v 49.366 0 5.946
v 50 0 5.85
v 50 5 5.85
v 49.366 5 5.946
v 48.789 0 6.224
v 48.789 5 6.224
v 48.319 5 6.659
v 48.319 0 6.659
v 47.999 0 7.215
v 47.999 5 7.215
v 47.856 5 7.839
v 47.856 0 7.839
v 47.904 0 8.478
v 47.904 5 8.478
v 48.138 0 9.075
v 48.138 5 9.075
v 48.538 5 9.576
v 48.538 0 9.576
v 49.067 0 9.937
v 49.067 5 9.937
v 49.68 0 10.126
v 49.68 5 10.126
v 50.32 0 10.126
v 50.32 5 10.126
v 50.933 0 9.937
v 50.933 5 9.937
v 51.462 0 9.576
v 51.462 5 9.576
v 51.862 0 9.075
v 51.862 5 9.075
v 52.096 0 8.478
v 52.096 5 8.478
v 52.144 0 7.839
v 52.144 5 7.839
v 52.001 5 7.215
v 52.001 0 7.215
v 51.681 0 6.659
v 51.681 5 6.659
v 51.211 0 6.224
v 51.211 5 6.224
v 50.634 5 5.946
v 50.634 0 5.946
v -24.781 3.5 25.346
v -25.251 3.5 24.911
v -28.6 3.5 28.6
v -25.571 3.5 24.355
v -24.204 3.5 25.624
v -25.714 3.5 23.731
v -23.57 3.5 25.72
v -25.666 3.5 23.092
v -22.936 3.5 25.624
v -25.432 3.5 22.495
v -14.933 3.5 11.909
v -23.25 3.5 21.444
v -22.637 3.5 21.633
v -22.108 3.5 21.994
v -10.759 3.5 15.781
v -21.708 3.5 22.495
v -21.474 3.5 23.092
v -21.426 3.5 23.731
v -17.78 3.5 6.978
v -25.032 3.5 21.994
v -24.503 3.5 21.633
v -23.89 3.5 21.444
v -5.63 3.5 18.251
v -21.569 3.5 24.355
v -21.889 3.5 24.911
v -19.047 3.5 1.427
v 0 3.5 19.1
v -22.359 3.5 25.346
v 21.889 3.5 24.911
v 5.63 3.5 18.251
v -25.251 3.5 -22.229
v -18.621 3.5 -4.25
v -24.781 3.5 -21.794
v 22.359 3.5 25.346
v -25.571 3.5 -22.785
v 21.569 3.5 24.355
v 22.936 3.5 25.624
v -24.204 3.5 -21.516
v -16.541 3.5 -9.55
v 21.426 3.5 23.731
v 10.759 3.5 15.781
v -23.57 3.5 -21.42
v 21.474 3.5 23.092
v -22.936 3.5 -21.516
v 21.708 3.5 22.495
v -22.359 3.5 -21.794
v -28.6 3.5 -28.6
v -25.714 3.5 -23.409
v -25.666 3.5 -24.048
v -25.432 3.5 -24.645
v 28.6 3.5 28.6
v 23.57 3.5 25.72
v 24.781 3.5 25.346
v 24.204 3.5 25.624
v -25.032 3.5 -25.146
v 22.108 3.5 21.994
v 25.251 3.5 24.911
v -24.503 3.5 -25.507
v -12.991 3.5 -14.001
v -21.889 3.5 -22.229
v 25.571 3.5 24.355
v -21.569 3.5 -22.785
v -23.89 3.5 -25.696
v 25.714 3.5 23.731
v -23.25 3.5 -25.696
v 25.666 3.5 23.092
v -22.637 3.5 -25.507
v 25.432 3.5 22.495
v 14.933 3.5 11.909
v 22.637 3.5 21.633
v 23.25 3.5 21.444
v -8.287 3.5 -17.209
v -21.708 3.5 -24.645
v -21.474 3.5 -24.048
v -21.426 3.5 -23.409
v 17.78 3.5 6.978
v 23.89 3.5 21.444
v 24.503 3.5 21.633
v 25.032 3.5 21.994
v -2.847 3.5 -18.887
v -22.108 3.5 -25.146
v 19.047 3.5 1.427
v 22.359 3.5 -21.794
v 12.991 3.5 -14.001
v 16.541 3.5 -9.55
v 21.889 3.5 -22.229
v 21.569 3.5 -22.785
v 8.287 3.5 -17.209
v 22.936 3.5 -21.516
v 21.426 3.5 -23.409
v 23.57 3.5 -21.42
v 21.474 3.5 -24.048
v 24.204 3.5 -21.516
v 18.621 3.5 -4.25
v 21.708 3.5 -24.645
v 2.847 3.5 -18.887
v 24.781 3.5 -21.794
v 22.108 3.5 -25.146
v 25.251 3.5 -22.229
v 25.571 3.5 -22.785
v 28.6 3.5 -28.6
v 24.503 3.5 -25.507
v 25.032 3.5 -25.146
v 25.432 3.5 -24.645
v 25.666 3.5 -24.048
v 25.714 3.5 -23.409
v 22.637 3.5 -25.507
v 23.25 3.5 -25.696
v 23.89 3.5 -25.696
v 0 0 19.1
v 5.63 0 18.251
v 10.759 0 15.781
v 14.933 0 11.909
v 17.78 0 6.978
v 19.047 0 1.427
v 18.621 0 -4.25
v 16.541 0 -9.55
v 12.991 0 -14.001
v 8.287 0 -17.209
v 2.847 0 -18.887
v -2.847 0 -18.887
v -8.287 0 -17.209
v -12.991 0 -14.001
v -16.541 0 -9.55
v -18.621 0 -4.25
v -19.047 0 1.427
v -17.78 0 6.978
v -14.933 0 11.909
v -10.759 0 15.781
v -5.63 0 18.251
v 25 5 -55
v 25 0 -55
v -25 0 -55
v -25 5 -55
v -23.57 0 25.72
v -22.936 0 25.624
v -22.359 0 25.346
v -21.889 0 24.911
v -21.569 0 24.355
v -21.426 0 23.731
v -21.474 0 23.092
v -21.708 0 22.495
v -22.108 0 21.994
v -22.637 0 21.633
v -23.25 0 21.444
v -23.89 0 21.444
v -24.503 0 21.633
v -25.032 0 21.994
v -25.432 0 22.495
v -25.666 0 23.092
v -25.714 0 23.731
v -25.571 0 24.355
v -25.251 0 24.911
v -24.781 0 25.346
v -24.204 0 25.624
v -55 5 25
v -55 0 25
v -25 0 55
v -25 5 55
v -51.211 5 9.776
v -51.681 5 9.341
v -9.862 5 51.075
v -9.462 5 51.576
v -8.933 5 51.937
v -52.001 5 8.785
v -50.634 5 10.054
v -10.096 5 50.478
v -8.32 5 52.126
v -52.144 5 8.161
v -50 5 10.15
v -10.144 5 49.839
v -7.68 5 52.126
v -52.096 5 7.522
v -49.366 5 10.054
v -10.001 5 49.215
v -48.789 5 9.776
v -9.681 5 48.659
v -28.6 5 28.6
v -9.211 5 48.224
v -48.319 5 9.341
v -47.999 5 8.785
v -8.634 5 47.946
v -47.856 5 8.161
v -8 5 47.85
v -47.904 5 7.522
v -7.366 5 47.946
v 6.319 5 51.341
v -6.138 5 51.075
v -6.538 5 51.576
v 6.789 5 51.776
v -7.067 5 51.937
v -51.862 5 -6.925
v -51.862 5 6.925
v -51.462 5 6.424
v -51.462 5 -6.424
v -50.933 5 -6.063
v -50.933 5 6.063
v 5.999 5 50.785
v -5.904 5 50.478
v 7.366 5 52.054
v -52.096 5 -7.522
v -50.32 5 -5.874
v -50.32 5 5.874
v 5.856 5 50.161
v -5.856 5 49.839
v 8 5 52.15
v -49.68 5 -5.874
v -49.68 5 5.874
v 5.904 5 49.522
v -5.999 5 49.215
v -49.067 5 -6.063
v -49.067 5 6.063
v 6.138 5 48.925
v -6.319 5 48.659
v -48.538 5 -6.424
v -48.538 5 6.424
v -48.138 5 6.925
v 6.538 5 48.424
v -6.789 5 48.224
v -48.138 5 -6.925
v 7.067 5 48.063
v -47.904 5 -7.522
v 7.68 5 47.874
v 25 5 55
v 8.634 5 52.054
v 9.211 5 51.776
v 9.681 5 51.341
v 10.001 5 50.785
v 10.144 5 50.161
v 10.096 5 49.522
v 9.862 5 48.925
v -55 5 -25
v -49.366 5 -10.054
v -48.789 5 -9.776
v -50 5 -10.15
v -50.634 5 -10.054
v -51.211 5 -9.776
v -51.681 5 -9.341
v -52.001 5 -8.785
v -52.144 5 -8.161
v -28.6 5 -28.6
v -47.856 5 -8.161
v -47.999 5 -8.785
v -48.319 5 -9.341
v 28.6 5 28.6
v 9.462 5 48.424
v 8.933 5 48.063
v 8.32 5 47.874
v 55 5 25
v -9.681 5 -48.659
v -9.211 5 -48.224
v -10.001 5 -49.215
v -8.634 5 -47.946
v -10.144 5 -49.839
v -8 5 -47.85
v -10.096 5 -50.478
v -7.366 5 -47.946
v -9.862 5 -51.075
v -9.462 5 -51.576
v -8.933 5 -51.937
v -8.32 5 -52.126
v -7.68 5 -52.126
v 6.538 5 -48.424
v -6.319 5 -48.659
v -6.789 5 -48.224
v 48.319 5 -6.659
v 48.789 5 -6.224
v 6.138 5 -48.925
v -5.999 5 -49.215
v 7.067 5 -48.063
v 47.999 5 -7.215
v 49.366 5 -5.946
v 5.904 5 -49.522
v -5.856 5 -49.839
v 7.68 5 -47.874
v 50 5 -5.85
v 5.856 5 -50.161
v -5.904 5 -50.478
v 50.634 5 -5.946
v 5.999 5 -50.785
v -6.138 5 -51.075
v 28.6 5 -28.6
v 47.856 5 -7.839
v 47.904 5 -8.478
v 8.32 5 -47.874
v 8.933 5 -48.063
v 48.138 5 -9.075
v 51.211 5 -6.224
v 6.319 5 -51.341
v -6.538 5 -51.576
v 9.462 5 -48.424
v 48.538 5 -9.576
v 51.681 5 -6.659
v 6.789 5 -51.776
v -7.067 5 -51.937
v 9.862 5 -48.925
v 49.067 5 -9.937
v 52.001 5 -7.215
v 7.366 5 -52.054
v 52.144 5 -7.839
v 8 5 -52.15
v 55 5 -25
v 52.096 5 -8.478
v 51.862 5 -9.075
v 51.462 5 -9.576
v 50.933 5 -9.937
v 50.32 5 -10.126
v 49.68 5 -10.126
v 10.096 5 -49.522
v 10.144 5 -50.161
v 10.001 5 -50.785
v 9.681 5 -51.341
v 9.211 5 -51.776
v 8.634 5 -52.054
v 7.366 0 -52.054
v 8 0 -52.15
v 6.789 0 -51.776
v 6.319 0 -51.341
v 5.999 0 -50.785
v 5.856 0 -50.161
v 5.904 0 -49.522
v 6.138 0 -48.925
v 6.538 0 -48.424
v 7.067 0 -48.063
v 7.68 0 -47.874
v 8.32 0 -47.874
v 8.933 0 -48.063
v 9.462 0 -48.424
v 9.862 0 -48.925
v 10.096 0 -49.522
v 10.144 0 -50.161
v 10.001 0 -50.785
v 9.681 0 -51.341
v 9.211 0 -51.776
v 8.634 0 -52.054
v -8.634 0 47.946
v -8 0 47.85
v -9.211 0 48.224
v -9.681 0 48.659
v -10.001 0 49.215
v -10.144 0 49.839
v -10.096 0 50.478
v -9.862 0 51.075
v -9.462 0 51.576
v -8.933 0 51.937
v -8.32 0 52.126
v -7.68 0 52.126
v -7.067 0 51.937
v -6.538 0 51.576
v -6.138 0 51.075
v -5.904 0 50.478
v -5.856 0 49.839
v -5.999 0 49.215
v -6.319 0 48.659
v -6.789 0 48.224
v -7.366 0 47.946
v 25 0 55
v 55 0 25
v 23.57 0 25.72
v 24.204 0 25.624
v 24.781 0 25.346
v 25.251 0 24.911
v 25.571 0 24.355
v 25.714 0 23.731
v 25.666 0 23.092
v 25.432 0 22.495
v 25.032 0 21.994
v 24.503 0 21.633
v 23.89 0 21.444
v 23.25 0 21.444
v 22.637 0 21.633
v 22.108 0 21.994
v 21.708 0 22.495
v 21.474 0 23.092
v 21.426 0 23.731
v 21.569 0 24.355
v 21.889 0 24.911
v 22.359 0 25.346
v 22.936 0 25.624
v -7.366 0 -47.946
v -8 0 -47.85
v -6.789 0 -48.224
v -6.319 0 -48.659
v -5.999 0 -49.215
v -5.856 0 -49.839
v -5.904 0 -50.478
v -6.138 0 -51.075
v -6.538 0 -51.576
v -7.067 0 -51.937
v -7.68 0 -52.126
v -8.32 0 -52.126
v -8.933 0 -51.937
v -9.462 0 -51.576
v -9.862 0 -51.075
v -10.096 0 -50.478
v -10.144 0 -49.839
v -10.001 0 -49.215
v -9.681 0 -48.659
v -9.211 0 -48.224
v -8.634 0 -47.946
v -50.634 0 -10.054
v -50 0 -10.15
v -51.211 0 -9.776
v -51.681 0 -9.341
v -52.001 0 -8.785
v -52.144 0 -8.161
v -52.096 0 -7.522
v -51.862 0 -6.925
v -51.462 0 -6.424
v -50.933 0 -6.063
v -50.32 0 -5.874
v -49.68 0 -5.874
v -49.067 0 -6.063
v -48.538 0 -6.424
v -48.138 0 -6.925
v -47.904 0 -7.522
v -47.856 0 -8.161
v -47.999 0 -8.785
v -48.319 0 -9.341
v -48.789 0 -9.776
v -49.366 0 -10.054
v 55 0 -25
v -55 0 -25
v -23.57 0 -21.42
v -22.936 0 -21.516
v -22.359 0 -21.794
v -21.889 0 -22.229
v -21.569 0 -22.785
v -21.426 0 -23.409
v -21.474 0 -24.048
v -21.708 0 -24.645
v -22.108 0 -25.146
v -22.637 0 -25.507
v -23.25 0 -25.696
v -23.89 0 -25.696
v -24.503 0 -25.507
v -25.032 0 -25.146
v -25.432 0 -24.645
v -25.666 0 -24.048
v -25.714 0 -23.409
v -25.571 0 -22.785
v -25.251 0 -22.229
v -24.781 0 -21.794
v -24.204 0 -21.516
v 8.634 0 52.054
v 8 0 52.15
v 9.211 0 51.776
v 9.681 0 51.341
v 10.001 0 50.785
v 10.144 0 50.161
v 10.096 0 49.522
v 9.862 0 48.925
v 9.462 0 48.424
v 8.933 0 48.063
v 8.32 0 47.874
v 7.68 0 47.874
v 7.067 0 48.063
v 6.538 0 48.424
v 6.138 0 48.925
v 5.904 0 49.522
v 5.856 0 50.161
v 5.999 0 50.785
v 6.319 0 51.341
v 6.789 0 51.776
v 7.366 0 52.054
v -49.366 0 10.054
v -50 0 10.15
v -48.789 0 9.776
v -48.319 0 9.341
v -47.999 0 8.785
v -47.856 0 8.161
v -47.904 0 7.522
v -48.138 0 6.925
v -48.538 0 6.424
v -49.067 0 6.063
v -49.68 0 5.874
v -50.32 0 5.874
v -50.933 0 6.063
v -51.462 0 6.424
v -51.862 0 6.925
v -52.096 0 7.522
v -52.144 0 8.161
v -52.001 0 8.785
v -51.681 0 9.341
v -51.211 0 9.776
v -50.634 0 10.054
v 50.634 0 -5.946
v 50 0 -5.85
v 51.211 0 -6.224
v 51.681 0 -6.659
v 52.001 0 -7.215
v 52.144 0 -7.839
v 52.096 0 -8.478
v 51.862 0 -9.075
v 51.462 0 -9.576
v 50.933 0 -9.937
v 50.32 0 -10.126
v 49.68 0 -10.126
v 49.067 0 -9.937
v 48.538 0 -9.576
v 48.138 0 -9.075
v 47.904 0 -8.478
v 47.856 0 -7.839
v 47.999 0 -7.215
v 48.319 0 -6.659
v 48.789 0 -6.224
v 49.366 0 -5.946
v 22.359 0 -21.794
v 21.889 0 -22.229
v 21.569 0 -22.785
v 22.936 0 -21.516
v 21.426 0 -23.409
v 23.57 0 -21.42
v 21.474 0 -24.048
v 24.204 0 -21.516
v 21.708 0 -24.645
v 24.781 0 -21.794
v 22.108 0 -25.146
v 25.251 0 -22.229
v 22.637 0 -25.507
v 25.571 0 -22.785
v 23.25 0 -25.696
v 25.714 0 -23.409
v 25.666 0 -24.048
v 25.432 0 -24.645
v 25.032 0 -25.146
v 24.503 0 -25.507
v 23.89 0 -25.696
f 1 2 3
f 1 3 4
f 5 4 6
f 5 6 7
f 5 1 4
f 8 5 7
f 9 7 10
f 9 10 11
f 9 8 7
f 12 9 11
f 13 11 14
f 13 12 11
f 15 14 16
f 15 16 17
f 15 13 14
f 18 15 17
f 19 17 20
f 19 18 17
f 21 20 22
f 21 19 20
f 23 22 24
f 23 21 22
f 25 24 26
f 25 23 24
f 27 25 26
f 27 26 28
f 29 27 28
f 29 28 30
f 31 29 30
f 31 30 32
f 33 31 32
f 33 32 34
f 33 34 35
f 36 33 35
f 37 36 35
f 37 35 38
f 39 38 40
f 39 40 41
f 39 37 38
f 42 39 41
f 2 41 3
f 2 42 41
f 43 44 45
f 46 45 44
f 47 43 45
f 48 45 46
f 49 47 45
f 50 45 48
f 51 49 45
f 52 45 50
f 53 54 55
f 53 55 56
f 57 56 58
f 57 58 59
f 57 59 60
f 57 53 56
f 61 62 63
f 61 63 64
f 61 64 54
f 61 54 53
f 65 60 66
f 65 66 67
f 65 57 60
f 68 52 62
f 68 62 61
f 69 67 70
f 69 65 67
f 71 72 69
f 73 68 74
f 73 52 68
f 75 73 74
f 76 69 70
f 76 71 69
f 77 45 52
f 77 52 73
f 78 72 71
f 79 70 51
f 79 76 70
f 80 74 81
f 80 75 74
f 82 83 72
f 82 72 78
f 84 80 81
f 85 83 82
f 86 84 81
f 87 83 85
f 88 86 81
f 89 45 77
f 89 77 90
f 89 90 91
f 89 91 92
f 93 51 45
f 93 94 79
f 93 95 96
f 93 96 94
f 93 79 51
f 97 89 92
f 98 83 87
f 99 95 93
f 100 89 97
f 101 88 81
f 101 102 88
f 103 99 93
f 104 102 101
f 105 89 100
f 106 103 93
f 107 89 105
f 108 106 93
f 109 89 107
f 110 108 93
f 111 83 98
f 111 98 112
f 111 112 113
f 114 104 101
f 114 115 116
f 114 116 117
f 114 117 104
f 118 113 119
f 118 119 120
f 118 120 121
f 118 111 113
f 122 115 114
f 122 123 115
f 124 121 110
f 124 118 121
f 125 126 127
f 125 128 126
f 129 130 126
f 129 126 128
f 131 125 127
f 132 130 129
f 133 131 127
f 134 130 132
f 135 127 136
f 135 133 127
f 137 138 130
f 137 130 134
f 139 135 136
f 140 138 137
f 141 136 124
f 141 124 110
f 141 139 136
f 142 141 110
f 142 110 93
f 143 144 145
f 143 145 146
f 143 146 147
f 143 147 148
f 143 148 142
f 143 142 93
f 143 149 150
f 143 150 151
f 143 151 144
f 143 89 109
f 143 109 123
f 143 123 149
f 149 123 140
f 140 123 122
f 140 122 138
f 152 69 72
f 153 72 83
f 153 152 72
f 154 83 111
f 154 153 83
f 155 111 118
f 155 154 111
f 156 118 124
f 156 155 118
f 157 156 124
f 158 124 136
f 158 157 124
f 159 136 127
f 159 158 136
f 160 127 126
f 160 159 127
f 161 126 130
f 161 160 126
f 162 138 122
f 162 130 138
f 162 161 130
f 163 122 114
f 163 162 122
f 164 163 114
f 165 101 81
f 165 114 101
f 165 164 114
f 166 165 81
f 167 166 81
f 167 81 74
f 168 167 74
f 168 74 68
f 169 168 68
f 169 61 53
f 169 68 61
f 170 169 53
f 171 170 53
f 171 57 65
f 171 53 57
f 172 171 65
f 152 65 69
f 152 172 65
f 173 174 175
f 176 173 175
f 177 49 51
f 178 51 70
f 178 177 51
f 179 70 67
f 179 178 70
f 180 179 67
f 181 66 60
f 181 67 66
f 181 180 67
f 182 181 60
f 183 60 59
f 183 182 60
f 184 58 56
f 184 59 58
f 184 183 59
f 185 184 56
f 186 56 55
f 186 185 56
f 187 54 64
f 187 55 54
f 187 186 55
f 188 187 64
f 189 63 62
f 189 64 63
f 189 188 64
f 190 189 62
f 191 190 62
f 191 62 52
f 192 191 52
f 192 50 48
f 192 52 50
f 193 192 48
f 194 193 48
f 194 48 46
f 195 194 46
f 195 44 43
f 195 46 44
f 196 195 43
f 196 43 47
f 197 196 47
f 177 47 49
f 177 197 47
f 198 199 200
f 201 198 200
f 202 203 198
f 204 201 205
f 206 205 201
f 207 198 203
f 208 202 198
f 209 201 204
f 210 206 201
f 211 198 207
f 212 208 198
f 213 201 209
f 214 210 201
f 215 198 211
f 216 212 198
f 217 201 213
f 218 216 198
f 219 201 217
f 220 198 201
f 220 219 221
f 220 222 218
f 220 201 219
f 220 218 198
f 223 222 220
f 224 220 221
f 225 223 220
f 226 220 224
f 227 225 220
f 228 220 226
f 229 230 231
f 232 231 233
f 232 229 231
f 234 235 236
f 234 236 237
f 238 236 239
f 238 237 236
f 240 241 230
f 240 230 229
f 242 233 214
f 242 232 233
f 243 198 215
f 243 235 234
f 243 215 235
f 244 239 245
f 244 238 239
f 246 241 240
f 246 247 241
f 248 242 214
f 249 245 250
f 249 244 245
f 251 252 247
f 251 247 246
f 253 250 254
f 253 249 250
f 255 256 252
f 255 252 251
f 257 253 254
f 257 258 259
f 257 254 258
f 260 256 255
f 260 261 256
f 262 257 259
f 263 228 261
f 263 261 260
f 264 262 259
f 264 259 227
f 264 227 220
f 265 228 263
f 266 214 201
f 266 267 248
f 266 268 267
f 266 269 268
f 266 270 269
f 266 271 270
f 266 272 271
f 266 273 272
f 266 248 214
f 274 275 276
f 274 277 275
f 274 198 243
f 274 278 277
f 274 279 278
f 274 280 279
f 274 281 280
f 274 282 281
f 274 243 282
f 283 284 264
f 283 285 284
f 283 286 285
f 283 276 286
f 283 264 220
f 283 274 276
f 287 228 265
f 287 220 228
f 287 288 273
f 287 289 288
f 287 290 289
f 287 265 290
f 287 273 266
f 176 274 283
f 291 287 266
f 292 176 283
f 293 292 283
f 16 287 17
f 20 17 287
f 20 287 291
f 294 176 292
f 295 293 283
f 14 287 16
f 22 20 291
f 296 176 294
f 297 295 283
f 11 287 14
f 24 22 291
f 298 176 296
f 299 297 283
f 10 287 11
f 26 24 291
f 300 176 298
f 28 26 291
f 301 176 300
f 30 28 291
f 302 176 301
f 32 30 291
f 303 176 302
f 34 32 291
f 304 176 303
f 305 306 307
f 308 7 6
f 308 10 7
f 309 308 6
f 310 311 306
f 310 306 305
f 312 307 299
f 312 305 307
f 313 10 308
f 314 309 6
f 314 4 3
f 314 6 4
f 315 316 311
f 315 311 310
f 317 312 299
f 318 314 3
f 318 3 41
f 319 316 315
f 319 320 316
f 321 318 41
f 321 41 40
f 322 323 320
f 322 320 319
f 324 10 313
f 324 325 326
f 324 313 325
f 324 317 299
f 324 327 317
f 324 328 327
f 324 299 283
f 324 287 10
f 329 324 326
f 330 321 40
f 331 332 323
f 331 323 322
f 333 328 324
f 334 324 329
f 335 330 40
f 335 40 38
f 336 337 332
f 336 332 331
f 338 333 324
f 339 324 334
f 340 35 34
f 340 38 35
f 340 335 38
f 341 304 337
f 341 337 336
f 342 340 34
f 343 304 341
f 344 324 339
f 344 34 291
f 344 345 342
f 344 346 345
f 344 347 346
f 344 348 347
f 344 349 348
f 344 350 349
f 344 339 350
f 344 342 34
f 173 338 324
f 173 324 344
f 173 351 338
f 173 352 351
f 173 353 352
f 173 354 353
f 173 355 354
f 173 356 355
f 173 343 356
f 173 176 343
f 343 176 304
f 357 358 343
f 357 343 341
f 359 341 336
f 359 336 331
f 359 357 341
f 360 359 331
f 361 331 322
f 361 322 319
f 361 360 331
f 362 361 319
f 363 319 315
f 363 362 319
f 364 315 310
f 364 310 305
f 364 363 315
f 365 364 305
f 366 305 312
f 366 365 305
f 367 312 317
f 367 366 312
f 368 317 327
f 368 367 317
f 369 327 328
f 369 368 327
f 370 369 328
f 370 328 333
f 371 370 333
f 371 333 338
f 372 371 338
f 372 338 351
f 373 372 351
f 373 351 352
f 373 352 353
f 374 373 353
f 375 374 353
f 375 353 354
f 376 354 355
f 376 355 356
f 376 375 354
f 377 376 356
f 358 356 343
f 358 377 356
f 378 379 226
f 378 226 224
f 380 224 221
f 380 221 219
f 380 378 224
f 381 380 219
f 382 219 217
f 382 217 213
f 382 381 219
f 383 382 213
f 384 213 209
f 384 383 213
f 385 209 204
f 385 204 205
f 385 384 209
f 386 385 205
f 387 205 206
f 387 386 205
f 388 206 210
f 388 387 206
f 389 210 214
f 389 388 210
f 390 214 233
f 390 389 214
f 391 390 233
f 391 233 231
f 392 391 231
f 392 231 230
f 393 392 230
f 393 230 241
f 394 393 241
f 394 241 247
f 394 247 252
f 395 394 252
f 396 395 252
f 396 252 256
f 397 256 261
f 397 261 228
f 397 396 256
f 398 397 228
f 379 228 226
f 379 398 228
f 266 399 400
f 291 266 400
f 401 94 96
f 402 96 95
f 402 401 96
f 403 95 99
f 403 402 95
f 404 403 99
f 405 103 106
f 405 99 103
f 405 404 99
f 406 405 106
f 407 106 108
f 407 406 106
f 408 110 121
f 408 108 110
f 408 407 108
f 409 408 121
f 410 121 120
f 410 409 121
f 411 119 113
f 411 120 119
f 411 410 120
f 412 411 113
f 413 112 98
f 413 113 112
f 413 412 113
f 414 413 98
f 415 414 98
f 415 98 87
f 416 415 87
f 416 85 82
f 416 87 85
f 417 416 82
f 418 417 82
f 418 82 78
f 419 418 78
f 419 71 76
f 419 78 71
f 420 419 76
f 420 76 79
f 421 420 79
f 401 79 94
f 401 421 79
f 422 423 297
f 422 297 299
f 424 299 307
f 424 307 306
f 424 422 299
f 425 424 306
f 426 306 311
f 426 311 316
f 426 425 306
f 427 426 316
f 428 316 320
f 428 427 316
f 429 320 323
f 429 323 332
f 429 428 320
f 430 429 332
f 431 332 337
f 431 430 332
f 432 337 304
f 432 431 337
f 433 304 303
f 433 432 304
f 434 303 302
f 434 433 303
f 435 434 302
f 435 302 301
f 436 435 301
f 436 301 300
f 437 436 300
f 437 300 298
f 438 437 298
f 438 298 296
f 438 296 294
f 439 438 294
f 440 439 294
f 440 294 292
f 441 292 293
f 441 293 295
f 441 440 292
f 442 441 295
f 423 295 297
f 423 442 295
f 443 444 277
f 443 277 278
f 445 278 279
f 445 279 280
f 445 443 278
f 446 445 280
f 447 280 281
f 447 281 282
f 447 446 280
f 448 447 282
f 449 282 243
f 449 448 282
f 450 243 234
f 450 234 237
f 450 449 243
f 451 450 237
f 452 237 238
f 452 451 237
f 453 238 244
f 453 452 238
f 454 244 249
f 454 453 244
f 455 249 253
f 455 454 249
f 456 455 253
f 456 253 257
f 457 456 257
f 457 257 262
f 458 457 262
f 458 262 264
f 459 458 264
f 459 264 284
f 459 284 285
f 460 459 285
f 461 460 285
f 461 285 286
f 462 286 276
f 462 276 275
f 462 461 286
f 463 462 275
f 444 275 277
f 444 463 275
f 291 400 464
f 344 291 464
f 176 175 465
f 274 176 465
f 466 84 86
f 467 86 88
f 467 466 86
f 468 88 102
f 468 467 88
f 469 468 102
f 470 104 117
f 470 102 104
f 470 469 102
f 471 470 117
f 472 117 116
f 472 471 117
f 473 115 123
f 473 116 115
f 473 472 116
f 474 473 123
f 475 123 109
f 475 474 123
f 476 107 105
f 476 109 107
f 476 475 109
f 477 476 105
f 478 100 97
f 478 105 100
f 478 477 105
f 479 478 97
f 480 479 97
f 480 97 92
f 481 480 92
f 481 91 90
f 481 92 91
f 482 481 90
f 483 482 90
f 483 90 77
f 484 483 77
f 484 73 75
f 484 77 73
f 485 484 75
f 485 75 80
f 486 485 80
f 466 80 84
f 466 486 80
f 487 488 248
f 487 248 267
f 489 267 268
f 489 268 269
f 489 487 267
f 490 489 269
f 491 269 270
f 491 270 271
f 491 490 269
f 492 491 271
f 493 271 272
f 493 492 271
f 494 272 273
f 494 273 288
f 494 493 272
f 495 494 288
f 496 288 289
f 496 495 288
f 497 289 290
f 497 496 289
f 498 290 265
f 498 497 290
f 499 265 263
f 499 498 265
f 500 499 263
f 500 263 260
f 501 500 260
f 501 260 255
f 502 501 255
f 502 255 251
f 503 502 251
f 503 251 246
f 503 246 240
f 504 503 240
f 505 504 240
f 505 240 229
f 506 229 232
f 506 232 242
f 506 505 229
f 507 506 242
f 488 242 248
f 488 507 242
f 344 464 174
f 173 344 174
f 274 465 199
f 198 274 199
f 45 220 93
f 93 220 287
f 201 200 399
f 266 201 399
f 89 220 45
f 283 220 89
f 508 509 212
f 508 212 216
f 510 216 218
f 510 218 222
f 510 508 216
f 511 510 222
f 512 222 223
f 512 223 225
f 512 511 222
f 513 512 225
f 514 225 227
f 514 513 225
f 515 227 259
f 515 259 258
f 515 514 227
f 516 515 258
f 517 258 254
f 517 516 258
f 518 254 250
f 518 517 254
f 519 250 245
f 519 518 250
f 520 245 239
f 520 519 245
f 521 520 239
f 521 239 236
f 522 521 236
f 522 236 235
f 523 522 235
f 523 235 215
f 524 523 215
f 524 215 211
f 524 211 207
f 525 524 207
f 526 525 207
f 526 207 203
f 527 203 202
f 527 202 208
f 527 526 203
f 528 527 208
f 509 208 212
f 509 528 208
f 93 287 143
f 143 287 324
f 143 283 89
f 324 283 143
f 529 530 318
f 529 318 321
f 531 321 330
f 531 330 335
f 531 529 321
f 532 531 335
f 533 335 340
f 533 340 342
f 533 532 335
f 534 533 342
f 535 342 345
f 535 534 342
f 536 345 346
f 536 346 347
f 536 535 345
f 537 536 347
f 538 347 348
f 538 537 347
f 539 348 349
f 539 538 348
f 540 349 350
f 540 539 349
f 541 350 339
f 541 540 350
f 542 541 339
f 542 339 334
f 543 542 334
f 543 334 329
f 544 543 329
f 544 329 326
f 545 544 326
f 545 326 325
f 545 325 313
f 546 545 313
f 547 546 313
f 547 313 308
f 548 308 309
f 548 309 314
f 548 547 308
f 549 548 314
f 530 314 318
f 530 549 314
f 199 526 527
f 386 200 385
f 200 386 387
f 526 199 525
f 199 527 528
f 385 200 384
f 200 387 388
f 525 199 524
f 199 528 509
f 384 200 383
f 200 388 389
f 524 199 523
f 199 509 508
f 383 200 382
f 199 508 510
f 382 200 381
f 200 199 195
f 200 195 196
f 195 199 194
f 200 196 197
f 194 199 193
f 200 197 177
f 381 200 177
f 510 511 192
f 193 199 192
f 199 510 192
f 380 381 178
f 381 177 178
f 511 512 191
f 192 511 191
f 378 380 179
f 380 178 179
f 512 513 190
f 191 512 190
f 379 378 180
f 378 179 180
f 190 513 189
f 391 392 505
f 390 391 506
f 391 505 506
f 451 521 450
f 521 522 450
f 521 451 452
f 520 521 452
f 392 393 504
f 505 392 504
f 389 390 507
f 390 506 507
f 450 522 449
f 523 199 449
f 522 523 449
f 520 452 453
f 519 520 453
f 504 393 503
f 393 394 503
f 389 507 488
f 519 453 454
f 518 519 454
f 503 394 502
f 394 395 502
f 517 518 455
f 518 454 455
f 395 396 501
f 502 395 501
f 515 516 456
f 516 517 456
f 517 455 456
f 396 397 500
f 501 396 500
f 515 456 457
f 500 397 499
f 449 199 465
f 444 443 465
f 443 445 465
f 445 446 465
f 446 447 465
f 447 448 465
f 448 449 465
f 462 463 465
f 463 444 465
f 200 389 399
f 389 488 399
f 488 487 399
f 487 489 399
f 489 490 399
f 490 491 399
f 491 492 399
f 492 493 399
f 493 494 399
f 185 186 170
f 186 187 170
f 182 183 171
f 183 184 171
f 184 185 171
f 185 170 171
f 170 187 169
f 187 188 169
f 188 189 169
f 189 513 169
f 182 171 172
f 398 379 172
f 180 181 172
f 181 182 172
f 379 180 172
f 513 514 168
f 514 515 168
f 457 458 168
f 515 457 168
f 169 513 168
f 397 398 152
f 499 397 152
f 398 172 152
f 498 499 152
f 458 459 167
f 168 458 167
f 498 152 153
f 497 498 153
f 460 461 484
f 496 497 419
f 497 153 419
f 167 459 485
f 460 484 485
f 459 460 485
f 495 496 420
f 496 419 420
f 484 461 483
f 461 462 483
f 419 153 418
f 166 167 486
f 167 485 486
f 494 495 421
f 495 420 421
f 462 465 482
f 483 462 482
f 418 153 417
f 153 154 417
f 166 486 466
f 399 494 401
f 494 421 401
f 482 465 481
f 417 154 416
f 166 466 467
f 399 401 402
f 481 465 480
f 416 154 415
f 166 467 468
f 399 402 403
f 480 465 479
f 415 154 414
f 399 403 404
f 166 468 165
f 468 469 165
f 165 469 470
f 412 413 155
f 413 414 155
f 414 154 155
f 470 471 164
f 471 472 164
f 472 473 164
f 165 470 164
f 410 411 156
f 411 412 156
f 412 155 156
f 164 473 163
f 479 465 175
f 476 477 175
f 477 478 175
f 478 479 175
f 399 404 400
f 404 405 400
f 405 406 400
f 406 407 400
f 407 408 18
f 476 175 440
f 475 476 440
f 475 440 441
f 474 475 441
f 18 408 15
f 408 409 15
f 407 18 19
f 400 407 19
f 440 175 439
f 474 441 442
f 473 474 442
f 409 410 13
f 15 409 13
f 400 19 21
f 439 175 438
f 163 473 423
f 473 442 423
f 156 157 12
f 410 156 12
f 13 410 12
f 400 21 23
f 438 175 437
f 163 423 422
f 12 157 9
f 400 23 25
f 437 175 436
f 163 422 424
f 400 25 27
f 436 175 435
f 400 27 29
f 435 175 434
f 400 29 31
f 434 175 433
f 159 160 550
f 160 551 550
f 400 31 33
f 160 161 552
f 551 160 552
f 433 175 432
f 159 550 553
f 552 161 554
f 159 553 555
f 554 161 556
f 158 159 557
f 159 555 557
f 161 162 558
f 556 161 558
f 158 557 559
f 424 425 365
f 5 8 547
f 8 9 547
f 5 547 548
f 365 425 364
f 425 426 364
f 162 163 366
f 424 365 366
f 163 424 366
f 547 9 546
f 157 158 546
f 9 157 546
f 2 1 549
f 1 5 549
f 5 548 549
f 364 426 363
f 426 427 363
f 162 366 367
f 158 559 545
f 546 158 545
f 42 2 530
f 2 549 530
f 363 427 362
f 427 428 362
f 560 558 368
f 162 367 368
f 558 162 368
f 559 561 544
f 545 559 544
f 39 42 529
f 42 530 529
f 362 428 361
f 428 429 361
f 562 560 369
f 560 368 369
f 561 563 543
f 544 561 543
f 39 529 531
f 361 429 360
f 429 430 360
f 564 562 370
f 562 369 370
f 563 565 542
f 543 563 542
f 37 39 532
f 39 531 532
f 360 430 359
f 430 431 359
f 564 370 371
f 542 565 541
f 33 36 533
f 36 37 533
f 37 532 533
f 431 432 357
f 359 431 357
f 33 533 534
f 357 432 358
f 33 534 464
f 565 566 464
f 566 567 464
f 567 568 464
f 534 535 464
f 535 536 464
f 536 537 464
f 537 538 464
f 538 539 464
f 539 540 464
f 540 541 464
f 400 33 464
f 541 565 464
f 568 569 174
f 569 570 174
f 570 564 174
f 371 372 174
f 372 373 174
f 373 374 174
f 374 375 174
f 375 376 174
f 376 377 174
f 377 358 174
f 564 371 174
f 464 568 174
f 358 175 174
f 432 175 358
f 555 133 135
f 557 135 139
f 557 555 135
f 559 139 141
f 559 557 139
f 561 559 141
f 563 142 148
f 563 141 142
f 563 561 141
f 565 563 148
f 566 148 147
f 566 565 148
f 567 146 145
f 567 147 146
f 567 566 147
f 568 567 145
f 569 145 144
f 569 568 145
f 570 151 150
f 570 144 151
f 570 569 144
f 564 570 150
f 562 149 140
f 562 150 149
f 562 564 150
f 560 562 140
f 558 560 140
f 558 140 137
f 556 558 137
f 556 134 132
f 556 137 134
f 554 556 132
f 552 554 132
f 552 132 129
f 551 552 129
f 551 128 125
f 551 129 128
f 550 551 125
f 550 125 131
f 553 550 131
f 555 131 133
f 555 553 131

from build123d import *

# Parameters (mm, degrees)
SKETCH1_R           = 2.15
SKETCH1_R_2         = 19.1
BOSS_EXTRUDE1_DEPTH = 5
SKETCH2_W           = 57.2
SKETCH2_H           = 57.2
CUT_EXTRUDE1_DEPTH  = 1.5


with BuildPart() as part:
    # Sketch1 → Boss-Extrude1 (new body)
    with BuildSketch(Plane(origin=(0, 0, 0), x_dir=(1, 0, 0), z_dir=(0, 1, 0))):
        Polygon((-25, -55), (25, -55), (55, -25), (55, 25), (25, 55), (-25, 55), (-55, 25), (-55, -25), align=None)
        with Locations(Location((23.57, 23.57, 0), (0, 0, 270))):
            Circle(SKETCH1_R, mode=Mode.SUBTRACT)
        with Locations(Location((-23.57, 23.57, 0), (0, 0, 270))):
            Circle(SKETCH1_R, mode=Mode.SUBTRACT)
        with Locations(Location((-23.57, -23.57, 0), (0, 0, 270))):
            Circle(SKETCH1_R, mode=Mode.SUBTRACT)
        with Locations(Location((23.57, -23.57, 0), (0, 0, 270))):
            Circle(SKETCH1_R, mode=Mode.SUBTRACT)
        with Locations(Location((0, 0, 0), (0, 0, 270))):
            Circle(SKETCH1_R_2, mode=Mode.SUBTRACT)
        with Locations(Location((-8, 50, 0), (0, 0, 270))):
            Circle(SKETCH1_R, mode=Mode.SUBTRACT)
        with Locations(Location((8, 50, 0), (0, 0, 90))):
            Circle(SKETCH1_R, mode=Mode.SUBTRACT)
        with Locations(Location((50, 8, 0), (0, 0, 270))):
            Circle(SKETCH1_R, mode=Mode.SUBTRACT)
        with Locations(Location((50, -8, 0), (0, 0, 90))):
            Circle(SKETCH1_R, mode=Mode.SUBTRACT)
        with Locations(Location((8, -50, 0), (0, 0, 270))):
            Circle(SKETCH1_R, mode=Mode.SUBTRACT)
        with Locations(Location((-8, -50, 0), (0, 0, 90))):
            Circle(SKETCH1_R, mode=Mode.SUBTRACT)
        with Locations(Location((-50, -8, 0), (0, 0, 270))):
            Circle(SKETCH1_R, mode=Mode.SUBTRACT)
        with Locations(Location((-50, 8, 0), (0, 0, 90))):
            Circle(SKETCH1_R, mode=Mode.SUBTRACT)
    extrude(amount=BOSS_EXTRUDE1_DEPTH)

    # Sketch2 → Cut-Extrude1 (cut)
    with BuildSketch(Plane(origin=(0, 5, 0), x_dir=(1, 0, 0), z_dir=(0, 1, 0))):
        Rectangle(SKETCH2_W, SKETCH2_H)
    extrude(amount=-CUT_EXTRUDE1_DEPTH, mode=Mode.SUBTRACT)


solid = part.part
